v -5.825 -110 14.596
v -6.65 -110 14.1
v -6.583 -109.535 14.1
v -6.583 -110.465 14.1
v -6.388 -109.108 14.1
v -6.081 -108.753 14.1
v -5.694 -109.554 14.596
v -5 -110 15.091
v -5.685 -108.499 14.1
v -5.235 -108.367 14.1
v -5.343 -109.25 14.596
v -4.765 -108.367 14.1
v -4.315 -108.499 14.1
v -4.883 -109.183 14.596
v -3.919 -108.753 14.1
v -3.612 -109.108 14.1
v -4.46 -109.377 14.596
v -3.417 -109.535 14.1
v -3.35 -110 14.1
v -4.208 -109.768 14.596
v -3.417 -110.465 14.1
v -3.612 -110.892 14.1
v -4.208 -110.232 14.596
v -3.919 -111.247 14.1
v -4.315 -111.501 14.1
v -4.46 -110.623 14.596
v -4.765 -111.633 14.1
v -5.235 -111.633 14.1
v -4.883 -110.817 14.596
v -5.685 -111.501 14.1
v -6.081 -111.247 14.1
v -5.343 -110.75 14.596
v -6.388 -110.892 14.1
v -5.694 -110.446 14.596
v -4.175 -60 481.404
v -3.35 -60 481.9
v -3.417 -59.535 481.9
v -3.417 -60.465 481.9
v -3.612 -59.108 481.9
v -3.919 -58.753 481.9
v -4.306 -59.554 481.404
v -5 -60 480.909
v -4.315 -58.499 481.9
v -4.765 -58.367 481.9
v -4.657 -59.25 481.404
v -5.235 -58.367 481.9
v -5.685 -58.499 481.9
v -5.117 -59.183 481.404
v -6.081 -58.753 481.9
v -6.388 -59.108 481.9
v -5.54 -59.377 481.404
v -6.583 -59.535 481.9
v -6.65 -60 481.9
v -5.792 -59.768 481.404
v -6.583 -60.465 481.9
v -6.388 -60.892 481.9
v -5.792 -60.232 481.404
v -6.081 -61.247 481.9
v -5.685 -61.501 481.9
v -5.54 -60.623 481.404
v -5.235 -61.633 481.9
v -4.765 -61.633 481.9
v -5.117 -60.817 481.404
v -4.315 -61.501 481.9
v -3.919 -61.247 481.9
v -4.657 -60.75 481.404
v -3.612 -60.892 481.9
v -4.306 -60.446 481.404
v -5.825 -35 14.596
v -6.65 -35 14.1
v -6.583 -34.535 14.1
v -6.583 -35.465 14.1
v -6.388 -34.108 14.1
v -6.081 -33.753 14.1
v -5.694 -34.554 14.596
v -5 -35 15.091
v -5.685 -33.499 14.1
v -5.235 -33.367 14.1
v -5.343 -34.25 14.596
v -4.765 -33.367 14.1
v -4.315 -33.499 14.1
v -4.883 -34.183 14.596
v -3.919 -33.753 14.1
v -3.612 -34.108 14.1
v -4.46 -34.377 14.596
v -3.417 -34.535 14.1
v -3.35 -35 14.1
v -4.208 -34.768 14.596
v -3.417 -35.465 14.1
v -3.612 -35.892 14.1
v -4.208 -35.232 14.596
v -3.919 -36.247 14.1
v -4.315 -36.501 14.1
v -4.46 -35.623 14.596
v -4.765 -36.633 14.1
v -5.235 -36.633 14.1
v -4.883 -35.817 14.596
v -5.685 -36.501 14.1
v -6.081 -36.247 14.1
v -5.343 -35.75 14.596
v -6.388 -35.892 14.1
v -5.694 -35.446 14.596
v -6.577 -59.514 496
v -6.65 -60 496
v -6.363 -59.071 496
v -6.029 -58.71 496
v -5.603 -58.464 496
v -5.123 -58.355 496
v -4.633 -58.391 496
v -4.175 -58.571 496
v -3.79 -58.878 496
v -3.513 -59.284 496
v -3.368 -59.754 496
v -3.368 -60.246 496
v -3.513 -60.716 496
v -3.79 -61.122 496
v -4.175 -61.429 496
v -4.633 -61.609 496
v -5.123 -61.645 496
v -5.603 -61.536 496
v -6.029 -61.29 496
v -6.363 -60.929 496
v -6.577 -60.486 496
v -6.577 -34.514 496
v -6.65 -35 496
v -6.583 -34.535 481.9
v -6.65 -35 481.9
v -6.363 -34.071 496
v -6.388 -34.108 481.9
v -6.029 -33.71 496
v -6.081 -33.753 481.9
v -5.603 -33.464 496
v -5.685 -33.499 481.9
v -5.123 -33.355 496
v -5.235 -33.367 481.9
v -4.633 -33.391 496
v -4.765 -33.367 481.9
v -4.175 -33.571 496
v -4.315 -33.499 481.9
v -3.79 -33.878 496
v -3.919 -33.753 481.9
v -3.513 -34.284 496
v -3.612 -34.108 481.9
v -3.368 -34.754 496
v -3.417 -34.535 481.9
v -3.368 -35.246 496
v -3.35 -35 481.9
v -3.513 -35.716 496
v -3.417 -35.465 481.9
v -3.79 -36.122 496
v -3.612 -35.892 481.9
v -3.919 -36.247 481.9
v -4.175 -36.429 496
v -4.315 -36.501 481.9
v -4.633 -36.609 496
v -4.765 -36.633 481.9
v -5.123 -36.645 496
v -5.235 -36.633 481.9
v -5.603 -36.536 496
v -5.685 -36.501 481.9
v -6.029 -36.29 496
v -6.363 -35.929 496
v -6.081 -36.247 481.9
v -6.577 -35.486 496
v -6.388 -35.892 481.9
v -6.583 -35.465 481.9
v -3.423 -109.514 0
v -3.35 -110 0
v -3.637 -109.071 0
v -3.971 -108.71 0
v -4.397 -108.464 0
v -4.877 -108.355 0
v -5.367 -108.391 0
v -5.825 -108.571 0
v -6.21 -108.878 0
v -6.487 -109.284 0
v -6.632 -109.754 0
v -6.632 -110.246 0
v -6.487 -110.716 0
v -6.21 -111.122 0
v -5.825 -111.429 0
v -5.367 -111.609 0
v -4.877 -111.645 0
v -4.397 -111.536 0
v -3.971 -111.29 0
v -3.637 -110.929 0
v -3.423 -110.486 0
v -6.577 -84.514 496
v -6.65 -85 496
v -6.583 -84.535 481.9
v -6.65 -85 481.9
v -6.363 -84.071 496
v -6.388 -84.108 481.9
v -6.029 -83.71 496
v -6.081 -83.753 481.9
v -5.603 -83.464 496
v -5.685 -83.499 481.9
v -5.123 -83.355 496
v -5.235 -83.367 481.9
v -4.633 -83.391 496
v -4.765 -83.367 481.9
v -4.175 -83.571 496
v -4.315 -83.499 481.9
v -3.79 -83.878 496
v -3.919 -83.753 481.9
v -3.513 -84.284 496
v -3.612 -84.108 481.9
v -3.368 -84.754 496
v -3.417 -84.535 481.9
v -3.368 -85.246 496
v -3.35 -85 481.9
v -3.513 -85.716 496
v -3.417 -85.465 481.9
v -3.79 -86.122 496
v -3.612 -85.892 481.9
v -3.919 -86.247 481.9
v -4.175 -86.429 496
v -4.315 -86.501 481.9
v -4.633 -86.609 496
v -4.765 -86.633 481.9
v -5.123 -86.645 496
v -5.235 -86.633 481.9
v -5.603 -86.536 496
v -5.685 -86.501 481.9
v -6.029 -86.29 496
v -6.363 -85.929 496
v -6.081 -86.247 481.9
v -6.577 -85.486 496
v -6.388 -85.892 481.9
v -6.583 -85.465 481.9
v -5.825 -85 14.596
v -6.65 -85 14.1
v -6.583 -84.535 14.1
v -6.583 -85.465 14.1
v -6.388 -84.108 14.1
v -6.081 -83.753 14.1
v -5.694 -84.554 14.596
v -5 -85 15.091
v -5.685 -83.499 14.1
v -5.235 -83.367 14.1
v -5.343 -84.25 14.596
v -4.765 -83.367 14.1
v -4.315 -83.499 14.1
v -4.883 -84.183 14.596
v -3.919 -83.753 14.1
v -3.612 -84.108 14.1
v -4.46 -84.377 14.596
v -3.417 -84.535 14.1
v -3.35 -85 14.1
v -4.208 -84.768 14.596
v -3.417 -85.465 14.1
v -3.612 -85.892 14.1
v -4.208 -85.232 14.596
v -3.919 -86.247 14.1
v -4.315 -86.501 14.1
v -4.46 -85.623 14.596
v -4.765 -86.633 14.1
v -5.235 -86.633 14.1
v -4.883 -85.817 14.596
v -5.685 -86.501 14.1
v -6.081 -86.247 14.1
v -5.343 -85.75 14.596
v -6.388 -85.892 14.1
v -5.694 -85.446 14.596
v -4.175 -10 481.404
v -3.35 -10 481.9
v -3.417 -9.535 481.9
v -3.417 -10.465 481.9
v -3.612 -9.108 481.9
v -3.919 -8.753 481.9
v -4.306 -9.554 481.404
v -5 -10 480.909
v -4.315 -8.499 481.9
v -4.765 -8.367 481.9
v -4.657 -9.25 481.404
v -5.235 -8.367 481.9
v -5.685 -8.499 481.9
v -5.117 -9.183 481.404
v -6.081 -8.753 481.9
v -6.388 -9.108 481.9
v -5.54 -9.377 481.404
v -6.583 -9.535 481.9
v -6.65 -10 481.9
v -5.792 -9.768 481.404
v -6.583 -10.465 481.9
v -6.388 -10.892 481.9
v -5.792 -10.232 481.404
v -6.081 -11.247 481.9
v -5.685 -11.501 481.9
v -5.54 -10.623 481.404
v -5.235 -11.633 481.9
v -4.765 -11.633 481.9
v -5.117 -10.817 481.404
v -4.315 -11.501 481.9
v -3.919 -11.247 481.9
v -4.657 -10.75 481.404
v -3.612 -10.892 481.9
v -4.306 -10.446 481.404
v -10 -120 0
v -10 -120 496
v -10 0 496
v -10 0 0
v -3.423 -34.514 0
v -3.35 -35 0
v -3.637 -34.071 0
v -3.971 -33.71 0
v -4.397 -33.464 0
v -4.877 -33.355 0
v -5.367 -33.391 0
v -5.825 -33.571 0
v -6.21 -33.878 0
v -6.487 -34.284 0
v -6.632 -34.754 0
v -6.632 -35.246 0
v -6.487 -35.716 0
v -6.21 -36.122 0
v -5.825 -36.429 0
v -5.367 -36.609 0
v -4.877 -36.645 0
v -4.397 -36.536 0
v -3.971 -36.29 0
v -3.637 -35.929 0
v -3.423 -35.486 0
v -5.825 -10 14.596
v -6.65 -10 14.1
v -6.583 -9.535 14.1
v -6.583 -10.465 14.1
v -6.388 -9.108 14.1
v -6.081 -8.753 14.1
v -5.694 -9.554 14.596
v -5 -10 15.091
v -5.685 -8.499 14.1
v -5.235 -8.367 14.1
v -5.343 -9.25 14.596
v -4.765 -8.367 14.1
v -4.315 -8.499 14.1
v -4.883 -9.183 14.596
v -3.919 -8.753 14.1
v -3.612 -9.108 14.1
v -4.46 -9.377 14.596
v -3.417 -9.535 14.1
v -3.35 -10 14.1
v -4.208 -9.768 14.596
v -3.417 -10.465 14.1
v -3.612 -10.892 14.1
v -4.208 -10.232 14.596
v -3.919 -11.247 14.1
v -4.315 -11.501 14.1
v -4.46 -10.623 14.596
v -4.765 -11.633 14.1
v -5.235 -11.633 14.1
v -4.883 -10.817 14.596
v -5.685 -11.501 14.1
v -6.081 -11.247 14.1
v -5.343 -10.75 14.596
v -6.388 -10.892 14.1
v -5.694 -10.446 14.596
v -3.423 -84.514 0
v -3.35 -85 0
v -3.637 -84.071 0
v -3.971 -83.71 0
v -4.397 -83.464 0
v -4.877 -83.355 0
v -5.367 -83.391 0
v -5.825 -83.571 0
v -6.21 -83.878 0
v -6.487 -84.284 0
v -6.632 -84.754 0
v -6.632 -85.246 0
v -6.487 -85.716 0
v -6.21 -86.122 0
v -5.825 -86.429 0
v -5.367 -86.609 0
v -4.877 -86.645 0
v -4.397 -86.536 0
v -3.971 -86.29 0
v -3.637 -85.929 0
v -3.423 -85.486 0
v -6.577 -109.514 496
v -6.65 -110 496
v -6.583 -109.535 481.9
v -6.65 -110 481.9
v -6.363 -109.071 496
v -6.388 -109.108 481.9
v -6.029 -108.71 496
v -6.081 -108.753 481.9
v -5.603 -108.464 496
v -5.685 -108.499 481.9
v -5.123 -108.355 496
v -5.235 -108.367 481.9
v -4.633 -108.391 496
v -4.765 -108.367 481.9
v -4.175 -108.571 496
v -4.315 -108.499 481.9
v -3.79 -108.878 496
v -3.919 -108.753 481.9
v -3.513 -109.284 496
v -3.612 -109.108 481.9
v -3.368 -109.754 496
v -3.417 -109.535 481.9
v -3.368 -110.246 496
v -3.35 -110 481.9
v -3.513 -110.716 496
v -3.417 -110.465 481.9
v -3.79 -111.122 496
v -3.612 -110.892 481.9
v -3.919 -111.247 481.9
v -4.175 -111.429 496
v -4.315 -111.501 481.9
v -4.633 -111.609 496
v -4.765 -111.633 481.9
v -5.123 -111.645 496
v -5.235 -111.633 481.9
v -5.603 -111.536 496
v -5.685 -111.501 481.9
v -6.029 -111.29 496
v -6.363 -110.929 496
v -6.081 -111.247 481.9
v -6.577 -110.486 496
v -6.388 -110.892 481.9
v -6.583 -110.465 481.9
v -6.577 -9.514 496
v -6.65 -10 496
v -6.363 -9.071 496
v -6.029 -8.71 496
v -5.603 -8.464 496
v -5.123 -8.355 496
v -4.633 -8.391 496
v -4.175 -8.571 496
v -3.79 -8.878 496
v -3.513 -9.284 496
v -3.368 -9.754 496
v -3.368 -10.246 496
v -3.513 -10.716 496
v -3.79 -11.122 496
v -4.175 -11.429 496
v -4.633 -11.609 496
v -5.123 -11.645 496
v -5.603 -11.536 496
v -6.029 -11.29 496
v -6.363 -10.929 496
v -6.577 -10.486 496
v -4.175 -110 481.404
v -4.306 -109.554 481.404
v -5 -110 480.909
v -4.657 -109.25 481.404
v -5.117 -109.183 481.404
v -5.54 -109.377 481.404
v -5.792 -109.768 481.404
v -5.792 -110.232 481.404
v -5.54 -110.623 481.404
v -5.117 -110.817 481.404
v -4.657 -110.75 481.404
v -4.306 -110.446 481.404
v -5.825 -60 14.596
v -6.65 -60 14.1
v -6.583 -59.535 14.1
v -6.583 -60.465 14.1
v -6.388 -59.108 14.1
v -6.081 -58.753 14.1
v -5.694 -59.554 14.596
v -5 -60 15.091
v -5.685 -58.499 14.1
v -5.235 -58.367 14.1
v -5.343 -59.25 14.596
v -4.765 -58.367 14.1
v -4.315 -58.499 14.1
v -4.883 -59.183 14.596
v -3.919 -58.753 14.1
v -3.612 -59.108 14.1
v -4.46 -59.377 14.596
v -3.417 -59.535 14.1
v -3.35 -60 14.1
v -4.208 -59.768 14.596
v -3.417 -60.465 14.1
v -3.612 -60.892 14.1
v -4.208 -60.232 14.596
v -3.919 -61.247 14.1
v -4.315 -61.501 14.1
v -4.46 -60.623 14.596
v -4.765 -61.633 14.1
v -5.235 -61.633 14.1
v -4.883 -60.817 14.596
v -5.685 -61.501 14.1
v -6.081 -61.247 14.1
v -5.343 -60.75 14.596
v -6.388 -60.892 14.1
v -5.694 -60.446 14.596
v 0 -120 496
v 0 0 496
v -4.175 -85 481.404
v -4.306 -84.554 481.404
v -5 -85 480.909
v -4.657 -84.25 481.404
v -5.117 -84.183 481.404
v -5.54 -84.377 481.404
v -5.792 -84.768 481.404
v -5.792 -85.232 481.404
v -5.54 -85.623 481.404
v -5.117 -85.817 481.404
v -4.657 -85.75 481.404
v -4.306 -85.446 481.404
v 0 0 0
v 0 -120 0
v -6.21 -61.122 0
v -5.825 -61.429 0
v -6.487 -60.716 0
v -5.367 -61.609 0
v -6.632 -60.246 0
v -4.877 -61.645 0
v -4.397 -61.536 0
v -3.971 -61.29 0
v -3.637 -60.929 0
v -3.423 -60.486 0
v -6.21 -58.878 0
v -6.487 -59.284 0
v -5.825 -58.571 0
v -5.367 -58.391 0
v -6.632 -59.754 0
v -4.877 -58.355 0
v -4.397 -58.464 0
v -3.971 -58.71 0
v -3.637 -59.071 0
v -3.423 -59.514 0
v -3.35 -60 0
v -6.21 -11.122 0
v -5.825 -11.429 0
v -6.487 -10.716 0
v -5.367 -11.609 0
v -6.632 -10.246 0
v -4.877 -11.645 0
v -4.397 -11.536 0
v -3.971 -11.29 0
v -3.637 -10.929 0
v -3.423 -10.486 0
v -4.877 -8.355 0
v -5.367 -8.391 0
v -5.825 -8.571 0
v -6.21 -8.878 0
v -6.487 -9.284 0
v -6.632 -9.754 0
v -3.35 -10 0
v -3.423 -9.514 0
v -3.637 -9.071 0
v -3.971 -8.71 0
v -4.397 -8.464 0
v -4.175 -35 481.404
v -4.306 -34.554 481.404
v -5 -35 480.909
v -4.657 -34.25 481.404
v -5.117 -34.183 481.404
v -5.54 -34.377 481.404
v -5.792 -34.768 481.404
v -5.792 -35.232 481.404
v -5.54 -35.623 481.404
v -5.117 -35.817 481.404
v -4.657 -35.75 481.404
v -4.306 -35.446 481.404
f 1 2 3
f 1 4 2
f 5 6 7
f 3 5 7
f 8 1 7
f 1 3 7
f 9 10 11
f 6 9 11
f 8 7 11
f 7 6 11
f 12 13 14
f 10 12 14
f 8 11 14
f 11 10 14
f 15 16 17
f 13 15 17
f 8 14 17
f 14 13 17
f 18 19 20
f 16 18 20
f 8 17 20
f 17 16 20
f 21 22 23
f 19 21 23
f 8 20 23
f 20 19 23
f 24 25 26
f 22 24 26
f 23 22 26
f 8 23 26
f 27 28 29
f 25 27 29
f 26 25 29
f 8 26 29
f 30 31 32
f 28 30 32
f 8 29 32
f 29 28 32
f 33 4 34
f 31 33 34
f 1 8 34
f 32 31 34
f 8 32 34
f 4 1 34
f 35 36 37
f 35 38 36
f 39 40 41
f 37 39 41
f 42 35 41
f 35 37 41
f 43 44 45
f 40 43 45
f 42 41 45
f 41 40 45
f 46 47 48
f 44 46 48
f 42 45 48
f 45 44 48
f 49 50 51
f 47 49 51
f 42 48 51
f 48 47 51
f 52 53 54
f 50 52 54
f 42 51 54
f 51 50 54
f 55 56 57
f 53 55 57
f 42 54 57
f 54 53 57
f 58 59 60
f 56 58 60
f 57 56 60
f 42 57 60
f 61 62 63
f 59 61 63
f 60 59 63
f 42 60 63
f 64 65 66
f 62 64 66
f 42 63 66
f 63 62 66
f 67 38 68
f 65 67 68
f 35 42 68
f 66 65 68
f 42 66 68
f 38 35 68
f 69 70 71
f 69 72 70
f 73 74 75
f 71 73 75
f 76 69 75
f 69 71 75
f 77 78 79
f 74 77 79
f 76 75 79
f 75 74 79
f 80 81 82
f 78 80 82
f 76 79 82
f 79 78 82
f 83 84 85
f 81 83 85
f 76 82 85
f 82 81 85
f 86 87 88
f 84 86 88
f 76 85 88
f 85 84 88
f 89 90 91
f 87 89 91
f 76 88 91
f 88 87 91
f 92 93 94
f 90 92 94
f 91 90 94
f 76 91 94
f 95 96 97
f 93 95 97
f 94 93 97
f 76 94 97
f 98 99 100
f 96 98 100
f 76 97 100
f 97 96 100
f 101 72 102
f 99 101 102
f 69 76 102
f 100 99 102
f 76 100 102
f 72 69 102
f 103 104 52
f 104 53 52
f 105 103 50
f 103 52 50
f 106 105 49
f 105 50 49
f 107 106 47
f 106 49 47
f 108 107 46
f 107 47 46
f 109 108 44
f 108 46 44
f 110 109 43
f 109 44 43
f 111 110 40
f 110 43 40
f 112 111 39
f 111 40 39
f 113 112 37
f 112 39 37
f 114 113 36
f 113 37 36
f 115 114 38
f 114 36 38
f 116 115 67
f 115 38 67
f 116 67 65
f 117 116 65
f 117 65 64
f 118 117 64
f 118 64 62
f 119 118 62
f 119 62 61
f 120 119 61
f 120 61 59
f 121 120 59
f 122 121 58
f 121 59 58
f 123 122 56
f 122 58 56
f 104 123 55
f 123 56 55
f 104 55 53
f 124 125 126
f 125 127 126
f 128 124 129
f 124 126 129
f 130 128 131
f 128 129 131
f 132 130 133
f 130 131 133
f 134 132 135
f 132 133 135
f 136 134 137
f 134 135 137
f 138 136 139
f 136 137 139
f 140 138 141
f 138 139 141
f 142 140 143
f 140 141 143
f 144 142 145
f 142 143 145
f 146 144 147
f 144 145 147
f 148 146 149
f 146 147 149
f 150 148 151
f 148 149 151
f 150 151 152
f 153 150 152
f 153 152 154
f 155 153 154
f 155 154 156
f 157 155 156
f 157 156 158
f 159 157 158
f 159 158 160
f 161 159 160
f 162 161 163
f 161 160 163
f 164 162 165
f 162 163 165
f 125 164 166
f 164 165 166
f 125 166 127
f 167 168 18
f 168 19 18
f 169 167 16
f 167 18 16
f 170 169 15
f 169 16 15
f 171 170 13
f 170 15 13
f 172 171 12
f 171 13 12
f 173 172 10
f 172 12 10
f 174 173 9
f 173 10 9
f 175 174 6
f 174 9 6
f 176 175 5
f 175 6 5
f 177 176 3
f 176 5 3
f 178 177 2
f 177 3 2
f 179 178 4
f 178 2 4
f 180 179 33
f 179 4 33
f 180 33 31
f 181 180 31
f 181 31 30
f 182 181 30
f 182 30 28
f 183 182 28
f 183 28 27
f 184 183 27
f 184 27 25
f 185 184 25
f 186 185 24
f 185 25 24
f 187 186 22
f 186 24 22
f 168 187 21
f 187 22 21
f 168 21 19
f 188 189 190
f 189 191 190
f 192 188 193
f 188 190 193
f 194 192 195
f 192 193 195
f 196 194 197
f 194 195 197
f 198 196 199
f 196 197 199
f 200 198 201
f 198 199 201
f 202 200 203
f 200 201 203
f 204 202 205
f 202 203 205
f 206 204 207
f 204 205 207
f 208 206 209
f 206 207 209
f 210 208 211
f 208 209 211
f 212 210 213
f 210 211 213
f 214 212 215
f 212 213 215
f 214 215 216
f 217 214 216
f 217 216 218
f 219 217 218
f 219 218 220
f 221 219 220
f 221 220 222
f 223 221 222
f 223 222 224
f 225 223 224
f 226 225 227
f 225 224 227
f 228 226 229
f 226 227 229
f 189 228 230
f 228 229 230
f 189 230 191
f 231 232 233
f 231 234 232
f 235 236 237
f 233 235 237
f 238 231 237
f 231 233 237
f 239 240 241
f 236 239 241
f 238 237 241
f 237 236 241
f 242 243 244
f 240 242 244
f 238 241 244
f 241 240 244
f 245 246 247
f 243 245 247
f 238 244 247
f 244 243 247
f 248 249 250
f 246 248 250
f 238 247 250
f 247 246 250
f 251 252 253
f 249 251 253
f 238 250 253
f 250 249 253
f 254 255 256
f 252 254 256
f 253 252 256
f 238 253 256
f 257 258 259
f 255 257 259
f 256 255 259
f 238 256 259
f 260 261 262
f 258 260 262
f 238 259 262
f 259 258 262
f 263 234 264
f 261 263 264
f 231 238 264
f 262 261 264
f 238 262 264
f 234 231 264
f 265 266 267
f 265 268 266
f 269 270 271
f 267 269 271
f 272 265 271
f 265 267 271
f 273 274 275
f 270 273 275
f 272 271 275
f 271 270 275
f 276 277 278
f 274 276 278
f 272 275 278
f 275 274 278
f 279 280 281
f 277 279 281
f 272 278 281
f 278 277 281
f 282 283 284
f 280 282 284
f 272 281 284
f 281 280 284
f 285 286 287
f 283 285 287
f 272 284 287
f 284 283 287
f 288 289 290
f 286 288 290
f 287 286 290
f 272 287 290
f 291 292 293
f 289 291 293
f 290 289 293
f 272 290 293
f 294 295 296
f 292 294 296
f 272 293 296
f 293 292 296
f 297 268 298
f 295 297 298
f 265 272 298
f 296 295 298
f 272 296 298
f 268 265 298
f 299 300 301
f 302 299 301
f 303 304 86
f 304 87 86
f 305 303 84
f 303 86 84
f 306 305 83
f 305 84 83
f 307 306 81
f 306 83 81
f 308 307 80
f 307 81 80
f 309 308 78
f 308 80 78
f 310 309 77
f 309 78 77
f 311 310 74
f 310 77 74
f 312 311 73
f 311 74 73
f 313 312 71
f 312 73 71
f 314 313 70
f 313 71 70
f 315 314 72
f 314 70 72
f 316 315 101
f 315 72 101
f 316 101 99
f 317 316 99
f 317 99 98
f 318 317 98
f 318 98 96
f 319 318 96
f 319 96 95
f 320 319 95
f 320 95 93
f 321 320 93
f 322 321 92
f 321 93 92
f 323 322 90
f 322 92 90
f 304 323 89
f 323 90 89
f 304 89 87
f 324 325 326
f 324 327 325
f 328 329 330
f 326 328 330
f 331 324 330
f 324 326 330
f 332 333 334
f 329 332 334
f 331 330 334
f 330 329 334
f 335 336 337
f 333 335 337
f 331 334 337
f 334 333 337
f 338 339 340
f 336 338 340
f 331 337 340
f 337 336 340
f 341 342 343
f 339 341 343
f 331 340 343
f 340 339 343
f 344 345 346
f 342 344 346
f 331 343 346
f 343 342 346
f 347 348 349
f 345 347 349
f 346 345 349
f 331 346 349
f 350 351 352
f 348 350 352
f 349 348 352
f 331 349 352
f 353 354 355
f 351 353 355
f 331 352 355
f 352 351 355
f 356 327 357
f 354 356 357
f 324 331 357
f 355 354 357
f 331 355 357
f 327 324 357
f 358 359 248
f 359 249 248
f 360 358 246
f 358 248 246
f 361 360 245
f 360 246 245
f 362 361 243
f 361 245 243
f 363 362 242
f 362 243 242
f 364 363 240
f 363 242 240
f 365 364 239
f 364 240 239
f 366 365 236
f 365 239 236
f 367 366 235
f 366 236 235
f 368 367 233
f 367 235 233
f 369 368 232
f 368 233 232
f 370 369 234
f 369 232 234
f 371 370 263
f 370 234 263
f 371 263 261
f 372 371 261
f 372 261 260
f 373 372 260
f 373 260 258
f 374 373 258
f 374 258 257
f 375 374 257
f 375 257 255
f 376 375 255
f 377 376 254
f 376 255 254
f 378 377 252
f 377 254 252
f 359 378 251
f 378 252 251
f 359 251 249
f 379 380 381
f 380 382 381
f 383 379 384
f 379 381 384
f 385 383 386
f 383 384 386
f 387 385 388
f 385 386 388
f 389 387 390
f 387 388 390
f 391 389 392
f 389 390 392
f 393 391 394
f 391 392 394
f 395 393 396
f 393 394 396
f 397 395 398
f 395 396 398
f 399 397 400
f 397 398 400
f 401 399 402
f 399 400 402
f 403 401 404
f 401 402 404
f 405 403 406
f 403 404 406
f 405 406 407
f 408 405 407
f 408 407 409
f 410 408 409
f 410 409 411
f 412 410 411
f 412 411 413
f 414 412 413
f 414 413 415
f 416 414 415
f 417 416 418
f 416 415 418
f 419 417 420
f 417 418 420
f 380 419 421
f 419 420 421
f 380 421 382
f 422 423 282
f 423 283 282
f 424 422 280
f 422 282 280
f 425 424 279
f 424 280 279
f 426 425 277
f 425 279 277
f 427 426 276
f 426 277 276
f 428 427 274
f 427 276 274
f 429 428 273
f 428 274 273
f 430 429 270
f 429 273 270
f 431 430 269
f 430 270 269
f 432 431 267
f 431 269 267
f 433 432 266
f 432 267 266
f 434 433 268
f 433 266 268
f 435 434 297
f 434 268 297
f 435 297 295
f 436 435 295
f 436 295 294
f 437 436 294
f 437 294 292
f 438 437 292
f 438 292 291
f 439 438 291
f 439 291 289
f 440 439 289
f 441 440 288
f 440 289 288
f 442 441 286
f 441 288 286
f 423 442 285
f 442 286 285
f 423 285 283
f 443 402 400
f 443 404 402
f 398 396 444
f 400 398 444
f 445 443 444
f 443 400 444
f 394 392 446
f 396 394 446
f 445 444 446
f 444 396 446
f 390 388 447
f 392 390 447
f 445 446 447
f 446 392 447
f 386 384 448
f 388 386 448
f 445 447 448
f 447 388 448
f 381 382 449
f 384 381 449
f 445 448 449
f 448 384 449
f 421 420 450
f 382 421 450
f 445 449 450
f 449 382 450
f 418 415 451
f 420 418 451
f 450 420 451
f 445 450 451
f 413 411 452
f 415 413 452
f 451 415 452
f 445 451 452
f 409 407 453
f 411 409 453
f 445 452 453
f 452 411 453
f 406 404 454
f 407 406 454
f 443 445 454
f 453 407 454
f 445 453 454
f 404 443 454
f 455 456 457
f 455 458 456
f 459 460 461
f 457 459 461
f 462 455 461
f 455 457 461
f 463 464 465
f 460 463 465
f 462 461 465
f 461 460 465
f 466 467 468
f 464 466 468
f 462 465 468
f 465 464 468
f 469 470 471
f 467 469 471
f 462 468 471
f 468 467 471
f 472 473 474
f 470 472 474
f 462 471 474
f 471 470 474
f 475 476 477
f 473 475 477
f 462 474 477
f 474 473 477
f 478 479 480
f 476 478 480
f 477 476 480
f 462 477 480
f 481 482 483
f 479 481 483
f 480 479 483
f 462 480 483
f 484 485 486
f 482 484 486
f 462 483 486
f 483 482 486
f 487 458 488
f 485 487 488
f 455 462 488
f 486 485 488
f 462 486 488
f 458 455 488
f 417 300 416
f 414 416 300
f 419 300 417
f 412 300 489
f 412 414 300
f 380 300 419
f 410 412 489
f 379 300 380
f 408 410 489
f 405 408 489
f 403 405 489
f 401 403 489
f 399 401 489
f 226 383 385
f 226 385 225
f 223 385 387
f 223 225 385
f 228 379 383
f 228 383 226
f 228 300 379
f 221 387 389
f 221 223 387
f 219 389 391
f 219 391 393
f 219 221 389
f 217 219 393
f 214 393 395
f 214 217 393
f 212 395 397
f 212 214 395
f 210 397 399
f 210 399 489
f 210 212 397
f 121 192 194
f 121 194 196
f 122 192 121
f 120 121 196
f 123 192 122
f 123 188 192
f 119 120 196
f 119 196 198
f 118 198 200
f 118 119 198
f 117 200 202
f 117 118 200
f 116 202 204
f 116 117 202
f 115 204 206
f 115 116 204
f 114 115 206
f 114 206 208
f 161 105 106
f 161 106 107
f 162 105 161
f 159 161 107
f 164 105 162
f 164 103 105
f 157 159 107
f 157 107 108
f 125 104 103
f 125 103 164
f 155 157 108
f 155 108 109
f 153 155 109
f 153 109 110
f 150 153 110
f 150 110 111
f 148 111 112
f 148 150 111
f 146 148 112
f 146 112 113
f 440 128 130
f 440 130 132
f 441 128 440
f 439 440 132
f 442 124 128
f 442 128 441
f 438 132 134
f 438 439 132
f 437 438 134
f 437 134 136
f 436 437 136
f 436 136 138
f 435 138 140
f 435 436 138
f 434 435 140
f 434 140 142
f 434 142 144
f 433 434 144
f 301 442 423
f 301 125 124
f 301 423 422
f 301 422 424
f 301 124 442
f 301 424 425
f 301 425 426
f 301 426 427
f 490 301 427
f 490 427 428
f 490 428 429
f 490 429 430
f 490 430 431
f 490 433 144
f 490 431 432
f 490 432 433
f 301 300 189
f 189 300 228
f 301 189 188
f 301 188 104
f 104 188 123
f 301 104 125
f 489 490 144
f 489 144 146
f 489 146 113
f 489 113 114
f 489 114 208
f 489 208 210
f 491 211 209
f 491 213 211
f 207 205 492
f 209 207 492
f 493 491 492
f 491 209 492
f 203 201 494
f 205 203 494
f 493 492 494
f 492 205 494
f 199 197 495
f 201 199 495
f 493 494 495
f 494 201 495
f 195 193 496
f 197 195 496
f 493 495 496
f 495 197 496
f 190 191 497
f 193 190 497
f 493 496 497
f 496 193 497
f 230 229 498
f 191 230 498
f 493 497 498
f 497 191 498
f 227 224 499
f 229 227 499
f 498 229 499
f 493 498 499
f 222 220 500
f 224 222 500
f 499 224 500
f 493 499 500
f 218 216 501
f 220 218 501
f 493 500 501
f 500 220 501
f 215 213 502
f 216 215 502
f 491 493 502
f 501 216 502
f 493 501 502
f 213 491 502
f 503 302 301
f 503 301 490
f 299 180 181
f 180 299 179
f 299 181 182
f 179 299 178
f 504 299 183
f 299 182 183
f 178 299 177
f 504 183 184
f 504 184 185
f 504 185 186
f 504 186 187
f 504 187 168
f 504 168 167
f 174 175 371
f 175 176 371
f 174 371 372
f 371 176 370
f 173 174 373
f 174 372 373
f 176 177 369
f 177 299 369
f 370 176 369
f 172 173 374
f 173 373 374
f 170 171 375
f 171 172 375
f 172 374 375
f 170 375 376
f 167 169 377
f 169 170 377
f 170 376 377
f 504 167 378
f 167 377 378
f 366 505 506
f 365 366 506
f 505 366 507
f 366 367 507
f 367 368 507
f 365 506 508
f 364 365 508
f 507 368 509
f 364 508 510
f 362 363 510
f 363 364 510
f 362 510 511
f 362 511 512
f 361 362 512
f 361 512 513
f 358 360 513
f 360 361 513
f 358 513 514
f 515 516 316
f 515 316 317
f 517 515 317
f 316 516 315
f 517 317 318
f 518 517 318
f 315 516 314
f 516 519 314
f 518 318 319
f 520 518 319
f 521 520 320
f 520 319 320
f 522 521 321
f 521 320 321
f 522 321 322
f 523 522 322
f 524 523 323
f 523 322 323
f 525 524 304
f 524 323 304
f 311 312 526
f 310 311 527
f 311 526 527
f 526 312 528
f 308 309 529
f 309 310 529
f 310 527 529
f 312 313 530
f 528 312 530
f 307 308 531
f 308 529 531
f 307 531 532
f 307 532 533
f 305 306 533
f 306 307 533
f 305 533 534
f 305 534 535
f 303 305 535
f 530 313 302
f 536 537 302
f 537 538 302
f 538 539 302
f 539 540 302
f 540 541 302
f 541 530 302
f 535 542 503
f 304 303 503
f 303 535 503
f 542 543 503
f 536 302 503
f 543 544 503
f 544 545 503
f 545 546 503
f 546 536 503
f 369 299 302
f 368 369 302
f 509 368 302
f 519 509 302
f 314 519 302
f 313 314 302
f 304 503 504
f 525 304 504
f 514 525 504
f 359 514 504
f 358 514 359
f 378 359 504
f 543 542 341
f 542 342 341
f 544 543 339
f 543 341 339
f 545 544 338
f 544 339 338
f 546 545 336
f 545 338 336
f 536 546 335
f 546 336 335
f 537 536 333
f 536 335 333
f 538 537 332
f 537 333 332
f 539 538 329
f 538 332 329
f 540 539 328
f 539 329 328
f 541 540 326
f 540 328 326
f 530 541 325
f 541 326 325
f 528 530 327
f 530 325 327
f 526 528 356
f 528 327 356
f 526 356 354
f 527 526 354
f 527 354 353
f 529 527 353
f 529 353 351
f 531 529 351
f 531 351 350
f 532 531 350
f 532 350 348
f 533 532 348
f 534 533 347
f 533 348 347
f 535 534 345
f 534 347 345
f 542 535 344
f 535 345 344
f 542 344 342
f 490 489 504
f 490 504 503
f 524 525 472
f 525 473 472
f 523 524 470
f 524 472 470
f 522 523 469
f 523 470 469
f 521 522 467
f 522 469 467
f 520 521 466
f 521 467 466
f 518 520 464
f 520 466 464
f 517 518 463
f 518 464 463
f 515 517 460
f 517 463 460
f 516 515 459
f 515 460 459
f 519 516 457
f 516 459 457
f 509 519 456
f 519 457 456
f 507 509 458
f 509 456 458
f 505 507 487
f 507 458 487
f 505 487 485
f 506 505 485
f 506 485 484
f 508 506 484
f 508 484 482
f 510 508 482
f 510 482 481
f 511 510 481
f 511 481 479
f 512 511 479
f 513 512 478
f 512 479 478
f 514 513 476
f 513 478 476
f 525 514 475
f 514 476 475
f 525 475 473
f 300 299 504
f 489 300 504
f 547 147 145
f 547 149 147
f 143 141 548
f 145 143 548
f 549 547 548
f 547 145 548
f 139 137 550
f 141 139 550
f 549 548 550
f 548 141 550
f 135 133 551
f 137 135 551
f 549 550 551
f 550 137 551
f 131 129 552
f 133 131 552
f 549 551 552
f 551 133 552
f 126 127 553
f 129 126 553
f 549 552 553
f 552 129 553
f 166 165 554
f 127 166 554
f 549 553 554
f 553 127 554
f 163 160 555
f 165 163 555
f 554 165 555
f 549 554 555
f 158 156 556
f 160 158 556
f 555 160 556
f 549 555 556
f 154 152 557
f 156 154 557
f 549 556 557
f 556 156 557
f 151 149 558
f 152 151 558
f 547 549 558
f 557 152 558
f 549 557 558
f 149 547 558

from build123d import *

# Parameters (mm, degrees)
SKETCH2_W             = 10
SKETCH2_H             = 120
BOSS_EXTRUDE1_DEPTH   = 496
M4_TAPPED_HOLE1_D     = 3.3
M4_TAPPED_HOLE1_DEPTH = 14.1
M4_TAPPED_HOLE1_TIP   = 0.991420021
M4_TAPPED_HOLE2_D     = 3.3
M4_TAPPED_HOLE2_DEPTH = 14.1
M4_TAPPED_HOLE2_TIP   = 0.991420021


with BuildPart() as part:
    # Sketch2 → Boss-Extrude1 (new body)
    with BuildSketch(Plane.XY):
        with Locations((-5, -60)):
            Rectangle(SKETCH2_W, SKETCH2_H)
    extrude(amount=BOSS_EXTRUDE1_DEPTH)

    # M4 Tapped Hole1
    with Locations(Plane(origin=(-5, -10, 496), x_dir=(1, 0, 0), z_dir=(0, 0, 1))):
        with Locations((0, 0), (0, -25), (0, -50), (0, -75), (0, -100)):
            Hole(M4_TAPPED_HOLE1_D / 2, depth=M4_TAPPED_HOLE1_DEPTH)
            with Locations((0, 0, -(M4_TAPPED_HOLE1_DEPTH + M4_TAPPED_HOLE1_TIP / 2))):  # 118° drill point
                Cone(0, M4_TAPPED_HOLE1_D / 2, M4_TAPPED_HOLE1_TIP, mode=Mode.SUBTRACT)

    # M4 Tapped Hole2
    with Locations(Plane(origin=(-5, -10, 0), x_dir=(-1, 0, 0), z_dir=(0, 0, -1))):
        with Locations((0, 0), (0, -25), (0, -50), (0, -75), (0, -100)):
            Hole(M4_TAPPED_HOLE2_D / 2, depth=M4_TAPPED_HOLE2_DEPTH)
            with Locations((0, 0, -(M4_TAPPED_HOLE2_DEPTH + M4_TAPPED_HOLE2_TIP / 2))):  # 118° drill point
                Cone(0, M4_TAPPED_HOLE2_D / 2, M4_TAPPED_HOLE2_TIP, mode=Mode.SUBTRACT)


solid = part.part
